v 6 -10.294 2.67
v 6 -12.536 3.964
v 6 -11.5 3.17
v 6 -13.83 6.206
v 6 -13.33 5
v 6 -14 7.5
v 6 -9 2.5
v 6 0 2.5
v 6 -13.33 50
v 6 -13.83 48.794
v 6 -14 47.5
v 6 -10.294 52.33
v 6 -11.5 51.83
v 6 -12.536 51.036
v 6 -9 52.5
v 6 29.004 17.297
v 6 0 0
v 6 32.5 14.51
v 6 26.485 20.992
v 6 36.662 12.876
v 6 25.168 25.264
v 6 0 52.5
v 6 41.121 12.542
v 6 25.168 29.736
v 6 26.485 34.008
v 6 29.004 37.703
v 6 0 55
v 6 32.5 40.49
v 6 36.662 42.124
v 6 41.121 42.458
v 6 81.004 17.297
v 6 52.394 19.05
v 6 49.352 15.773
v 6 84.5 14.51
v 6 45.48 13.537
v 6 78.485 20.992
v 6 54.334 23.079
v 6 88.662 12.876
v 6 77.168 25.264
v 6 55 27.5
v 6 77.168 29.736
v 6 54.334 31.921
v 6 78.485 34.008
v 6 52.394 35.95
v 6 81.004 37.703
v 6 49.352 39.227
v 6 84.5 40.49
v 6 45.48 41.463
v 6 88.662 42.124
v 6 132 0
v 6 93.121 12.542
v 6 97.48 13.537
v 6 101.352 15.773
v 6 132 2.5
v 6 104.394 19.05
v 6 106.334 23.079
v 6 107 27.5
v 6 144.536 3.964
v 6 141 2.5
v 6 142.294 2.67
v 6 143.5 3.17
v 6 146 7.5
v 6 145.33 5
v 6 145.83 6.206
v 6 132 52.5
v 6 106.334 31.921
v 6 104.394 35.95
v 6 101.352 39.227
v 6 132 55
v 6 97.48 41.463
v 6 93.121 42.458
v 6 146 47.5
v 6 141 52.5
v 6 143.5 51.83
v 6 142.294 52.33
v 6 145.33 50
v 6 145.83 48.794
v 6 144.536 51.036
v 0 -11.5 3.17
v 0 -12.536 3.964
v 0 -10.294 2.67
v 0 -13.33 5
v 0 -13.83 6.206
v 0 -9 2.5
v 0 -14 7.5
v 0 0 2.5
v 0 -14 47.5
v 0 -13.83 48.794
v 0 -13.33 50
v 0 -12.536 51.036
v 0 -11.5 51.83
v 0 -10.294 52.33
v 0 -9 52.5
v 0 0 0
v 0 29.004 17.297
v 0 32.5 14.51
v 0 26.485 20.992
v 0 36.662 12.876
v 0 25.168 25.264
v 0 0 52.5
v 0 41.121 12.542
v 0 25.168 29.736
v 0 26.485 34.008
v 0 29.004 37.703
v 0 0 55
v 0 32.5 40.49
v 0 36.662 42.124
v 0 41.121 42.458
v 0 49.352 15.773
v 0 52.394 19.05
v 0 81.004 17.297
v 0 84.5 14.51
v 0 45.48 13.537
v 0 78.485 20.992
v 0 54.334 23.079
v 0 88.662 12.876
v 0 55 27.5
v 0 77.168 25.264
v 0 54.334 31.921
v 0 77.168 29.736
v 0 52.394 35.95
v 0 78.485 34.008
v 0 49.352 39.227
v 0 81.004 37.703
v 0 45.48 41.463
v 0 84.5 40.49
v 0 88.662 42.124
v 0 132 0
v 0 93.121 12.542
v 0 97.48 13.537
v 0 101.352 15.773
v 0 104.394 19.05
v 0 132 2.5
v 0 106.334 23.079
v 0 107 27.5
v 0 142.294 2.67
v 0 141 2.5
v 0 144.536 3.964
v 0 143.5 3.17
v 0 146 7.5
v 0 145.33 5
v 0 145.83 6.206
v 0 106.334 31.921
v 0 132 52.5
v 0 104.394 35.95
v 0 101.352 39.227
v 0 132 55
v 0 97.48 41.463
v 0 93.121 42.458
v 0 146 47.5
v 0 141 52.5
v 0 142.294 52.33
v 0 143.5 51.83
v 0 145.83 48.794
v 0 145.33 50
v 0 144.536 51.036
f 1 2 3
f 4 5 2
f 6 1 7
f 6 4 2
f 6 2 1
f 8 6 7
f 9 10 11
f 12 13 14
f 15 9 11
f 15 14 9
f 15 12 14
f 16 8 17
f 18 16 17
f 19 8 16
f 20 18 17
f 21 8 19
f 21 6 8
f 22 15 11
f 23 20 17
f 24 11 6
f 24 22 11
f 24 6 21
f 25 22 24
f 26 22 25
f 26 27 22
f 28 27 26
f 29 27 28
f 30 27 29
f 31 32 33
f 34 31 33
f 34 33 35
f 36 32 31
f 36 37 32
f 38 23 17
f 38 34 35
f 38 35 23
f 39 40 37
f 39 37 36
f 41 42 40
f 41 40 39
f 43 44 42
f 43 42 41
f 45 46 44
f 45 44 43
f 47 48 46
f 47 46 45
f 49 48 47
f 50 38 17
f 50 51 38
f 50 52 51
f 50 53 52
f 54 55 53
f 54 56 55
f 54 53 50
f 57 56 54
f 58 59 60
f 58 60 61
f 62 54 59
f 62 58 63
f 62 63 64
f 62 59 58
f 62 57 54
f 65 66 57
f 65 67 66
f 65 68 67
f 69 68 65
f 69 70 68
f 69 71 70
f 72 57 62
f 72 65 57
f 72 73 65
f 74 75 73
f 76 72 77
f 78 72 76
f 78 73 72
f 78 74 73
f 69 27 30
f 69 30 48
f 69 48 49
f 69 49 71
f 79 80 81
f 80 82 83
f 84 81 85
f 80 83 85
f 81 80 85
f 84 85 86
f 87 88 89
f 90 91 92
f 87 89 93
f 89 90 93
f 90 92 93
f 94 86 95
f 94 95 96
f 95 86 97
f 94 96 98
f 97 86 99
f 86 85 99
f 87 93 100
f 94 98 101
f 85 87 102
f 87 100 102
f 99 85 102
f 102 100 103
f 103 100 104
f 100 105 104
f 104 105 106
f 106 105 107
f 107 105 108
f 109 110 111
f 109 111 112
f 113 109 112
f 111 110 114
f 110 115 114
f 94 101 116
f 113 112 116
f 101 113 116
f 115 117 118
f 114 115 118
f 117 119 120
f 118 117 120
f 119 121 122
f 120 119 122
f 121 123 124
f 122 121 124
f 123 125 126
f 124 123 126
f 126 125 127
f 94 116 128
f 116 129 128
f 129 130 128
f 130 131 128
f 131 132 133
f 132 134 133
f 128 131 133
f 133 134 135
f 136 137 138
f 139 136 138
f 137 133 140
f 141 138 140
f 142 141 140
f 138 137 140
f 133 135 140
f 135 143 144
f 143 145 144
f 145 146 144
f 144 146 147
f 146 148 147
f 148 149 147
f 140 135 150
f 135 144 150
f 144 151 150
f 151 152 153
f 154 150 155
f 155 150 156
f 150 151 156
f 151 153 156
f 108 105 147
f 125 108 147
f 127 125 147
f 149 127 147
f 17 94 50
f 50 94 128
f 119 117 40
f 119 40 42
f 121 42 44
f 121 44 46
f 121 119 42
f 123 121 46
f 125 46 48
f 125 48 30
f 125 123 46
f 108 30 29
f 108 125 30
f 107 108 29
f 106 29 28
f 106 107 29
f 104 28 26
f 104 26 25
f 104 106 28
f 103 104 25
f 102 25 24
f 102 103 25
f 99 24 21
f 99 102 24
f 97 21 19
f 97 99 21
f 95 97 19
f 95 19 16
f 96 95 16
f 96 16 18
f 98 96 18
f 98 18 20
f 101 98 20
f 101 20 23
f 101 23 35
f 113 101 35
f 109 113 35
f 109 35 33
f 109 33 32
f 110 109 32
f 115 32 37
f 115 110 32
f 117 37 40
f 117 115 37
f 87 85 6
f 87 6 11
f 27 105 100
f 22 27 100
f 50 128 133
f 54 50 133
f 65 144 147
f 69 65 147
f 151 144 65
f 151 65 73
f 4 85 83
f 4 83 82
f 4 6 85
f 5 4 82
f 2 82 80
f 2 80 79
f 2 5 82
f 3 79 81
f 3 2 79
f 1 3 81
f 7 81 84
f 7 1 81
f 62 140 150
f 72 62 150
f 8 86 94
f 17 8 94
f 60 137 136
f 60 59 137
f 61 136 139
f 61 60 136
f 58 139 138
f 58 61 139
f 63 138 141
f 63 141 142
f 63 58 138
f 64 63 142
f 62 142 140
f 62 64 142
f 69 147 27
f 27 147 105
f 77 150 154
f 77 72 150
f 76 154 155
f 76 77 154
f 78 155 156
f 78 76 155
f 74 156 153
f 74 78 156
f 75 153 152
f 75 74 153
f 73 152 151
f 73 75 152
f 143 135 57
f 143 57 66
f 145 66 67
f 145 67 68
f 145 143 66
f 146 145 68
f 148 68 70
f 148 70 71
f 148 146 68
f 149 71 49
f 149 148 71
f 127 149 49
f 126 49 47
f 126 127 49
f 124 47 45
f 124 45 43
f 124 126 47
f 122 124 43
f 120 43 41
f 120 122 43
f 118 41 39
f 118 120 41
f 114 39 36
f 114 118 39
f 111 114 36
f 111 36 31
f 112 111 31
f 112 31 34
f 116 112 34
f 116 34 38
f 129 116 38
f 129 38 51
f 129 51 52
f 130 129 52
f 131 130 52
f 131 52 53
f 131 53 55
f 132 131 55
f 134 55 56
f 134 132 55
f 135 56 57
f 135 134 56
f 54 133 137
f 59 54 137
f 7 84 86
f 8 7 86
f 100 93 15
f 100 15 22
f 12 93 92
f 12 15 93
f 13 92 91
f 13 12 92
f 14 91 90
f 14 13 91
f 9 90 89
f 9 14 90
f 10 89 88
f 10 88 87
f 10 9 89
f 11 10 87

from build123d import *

# Parameters (mm, degrees)
F0_R     = 15
F0_W     = 14
F0_H     = 50
F1_DEPTH = 6
F2_R     = 5


with BuildPart() as f1:
    # F0 (on Right) → F1 (new body)
    with BuildSketch(Plane.YZ):
        Polygon((132, 55), (0, 55), (0, 52.5), (0, 2.5), (0, 0), (132, 0), (132, 2.5), (132, 52.5), align=None)
        with Locations((40, 27.5)):
            Circle(F0_R, mode=Mode.SUBTRACT)
        with Locations((92, 27.5)):
            Circle(F0_R, mode=Mode.SUBTRACT)
        with Locations((-7, 27.5)):
            Rectangle(F0_W, F0_H)
        with Locations((139, 27.5)):
            Rectangle(F0_W, F0_H)
    extrude(amount=F1_DEPTH)

    # F2
    f2_edges = [f1.edges().sort_by_distance(p)[0] for p in [
        (3, -14, 2.5),
        (3, -14, 52.5),
        (3, 146, 52.5),
        (3, 146, 2.5),
    ]]
    fillet(f2_edges, radius=F2_R)


solid = f1.part
